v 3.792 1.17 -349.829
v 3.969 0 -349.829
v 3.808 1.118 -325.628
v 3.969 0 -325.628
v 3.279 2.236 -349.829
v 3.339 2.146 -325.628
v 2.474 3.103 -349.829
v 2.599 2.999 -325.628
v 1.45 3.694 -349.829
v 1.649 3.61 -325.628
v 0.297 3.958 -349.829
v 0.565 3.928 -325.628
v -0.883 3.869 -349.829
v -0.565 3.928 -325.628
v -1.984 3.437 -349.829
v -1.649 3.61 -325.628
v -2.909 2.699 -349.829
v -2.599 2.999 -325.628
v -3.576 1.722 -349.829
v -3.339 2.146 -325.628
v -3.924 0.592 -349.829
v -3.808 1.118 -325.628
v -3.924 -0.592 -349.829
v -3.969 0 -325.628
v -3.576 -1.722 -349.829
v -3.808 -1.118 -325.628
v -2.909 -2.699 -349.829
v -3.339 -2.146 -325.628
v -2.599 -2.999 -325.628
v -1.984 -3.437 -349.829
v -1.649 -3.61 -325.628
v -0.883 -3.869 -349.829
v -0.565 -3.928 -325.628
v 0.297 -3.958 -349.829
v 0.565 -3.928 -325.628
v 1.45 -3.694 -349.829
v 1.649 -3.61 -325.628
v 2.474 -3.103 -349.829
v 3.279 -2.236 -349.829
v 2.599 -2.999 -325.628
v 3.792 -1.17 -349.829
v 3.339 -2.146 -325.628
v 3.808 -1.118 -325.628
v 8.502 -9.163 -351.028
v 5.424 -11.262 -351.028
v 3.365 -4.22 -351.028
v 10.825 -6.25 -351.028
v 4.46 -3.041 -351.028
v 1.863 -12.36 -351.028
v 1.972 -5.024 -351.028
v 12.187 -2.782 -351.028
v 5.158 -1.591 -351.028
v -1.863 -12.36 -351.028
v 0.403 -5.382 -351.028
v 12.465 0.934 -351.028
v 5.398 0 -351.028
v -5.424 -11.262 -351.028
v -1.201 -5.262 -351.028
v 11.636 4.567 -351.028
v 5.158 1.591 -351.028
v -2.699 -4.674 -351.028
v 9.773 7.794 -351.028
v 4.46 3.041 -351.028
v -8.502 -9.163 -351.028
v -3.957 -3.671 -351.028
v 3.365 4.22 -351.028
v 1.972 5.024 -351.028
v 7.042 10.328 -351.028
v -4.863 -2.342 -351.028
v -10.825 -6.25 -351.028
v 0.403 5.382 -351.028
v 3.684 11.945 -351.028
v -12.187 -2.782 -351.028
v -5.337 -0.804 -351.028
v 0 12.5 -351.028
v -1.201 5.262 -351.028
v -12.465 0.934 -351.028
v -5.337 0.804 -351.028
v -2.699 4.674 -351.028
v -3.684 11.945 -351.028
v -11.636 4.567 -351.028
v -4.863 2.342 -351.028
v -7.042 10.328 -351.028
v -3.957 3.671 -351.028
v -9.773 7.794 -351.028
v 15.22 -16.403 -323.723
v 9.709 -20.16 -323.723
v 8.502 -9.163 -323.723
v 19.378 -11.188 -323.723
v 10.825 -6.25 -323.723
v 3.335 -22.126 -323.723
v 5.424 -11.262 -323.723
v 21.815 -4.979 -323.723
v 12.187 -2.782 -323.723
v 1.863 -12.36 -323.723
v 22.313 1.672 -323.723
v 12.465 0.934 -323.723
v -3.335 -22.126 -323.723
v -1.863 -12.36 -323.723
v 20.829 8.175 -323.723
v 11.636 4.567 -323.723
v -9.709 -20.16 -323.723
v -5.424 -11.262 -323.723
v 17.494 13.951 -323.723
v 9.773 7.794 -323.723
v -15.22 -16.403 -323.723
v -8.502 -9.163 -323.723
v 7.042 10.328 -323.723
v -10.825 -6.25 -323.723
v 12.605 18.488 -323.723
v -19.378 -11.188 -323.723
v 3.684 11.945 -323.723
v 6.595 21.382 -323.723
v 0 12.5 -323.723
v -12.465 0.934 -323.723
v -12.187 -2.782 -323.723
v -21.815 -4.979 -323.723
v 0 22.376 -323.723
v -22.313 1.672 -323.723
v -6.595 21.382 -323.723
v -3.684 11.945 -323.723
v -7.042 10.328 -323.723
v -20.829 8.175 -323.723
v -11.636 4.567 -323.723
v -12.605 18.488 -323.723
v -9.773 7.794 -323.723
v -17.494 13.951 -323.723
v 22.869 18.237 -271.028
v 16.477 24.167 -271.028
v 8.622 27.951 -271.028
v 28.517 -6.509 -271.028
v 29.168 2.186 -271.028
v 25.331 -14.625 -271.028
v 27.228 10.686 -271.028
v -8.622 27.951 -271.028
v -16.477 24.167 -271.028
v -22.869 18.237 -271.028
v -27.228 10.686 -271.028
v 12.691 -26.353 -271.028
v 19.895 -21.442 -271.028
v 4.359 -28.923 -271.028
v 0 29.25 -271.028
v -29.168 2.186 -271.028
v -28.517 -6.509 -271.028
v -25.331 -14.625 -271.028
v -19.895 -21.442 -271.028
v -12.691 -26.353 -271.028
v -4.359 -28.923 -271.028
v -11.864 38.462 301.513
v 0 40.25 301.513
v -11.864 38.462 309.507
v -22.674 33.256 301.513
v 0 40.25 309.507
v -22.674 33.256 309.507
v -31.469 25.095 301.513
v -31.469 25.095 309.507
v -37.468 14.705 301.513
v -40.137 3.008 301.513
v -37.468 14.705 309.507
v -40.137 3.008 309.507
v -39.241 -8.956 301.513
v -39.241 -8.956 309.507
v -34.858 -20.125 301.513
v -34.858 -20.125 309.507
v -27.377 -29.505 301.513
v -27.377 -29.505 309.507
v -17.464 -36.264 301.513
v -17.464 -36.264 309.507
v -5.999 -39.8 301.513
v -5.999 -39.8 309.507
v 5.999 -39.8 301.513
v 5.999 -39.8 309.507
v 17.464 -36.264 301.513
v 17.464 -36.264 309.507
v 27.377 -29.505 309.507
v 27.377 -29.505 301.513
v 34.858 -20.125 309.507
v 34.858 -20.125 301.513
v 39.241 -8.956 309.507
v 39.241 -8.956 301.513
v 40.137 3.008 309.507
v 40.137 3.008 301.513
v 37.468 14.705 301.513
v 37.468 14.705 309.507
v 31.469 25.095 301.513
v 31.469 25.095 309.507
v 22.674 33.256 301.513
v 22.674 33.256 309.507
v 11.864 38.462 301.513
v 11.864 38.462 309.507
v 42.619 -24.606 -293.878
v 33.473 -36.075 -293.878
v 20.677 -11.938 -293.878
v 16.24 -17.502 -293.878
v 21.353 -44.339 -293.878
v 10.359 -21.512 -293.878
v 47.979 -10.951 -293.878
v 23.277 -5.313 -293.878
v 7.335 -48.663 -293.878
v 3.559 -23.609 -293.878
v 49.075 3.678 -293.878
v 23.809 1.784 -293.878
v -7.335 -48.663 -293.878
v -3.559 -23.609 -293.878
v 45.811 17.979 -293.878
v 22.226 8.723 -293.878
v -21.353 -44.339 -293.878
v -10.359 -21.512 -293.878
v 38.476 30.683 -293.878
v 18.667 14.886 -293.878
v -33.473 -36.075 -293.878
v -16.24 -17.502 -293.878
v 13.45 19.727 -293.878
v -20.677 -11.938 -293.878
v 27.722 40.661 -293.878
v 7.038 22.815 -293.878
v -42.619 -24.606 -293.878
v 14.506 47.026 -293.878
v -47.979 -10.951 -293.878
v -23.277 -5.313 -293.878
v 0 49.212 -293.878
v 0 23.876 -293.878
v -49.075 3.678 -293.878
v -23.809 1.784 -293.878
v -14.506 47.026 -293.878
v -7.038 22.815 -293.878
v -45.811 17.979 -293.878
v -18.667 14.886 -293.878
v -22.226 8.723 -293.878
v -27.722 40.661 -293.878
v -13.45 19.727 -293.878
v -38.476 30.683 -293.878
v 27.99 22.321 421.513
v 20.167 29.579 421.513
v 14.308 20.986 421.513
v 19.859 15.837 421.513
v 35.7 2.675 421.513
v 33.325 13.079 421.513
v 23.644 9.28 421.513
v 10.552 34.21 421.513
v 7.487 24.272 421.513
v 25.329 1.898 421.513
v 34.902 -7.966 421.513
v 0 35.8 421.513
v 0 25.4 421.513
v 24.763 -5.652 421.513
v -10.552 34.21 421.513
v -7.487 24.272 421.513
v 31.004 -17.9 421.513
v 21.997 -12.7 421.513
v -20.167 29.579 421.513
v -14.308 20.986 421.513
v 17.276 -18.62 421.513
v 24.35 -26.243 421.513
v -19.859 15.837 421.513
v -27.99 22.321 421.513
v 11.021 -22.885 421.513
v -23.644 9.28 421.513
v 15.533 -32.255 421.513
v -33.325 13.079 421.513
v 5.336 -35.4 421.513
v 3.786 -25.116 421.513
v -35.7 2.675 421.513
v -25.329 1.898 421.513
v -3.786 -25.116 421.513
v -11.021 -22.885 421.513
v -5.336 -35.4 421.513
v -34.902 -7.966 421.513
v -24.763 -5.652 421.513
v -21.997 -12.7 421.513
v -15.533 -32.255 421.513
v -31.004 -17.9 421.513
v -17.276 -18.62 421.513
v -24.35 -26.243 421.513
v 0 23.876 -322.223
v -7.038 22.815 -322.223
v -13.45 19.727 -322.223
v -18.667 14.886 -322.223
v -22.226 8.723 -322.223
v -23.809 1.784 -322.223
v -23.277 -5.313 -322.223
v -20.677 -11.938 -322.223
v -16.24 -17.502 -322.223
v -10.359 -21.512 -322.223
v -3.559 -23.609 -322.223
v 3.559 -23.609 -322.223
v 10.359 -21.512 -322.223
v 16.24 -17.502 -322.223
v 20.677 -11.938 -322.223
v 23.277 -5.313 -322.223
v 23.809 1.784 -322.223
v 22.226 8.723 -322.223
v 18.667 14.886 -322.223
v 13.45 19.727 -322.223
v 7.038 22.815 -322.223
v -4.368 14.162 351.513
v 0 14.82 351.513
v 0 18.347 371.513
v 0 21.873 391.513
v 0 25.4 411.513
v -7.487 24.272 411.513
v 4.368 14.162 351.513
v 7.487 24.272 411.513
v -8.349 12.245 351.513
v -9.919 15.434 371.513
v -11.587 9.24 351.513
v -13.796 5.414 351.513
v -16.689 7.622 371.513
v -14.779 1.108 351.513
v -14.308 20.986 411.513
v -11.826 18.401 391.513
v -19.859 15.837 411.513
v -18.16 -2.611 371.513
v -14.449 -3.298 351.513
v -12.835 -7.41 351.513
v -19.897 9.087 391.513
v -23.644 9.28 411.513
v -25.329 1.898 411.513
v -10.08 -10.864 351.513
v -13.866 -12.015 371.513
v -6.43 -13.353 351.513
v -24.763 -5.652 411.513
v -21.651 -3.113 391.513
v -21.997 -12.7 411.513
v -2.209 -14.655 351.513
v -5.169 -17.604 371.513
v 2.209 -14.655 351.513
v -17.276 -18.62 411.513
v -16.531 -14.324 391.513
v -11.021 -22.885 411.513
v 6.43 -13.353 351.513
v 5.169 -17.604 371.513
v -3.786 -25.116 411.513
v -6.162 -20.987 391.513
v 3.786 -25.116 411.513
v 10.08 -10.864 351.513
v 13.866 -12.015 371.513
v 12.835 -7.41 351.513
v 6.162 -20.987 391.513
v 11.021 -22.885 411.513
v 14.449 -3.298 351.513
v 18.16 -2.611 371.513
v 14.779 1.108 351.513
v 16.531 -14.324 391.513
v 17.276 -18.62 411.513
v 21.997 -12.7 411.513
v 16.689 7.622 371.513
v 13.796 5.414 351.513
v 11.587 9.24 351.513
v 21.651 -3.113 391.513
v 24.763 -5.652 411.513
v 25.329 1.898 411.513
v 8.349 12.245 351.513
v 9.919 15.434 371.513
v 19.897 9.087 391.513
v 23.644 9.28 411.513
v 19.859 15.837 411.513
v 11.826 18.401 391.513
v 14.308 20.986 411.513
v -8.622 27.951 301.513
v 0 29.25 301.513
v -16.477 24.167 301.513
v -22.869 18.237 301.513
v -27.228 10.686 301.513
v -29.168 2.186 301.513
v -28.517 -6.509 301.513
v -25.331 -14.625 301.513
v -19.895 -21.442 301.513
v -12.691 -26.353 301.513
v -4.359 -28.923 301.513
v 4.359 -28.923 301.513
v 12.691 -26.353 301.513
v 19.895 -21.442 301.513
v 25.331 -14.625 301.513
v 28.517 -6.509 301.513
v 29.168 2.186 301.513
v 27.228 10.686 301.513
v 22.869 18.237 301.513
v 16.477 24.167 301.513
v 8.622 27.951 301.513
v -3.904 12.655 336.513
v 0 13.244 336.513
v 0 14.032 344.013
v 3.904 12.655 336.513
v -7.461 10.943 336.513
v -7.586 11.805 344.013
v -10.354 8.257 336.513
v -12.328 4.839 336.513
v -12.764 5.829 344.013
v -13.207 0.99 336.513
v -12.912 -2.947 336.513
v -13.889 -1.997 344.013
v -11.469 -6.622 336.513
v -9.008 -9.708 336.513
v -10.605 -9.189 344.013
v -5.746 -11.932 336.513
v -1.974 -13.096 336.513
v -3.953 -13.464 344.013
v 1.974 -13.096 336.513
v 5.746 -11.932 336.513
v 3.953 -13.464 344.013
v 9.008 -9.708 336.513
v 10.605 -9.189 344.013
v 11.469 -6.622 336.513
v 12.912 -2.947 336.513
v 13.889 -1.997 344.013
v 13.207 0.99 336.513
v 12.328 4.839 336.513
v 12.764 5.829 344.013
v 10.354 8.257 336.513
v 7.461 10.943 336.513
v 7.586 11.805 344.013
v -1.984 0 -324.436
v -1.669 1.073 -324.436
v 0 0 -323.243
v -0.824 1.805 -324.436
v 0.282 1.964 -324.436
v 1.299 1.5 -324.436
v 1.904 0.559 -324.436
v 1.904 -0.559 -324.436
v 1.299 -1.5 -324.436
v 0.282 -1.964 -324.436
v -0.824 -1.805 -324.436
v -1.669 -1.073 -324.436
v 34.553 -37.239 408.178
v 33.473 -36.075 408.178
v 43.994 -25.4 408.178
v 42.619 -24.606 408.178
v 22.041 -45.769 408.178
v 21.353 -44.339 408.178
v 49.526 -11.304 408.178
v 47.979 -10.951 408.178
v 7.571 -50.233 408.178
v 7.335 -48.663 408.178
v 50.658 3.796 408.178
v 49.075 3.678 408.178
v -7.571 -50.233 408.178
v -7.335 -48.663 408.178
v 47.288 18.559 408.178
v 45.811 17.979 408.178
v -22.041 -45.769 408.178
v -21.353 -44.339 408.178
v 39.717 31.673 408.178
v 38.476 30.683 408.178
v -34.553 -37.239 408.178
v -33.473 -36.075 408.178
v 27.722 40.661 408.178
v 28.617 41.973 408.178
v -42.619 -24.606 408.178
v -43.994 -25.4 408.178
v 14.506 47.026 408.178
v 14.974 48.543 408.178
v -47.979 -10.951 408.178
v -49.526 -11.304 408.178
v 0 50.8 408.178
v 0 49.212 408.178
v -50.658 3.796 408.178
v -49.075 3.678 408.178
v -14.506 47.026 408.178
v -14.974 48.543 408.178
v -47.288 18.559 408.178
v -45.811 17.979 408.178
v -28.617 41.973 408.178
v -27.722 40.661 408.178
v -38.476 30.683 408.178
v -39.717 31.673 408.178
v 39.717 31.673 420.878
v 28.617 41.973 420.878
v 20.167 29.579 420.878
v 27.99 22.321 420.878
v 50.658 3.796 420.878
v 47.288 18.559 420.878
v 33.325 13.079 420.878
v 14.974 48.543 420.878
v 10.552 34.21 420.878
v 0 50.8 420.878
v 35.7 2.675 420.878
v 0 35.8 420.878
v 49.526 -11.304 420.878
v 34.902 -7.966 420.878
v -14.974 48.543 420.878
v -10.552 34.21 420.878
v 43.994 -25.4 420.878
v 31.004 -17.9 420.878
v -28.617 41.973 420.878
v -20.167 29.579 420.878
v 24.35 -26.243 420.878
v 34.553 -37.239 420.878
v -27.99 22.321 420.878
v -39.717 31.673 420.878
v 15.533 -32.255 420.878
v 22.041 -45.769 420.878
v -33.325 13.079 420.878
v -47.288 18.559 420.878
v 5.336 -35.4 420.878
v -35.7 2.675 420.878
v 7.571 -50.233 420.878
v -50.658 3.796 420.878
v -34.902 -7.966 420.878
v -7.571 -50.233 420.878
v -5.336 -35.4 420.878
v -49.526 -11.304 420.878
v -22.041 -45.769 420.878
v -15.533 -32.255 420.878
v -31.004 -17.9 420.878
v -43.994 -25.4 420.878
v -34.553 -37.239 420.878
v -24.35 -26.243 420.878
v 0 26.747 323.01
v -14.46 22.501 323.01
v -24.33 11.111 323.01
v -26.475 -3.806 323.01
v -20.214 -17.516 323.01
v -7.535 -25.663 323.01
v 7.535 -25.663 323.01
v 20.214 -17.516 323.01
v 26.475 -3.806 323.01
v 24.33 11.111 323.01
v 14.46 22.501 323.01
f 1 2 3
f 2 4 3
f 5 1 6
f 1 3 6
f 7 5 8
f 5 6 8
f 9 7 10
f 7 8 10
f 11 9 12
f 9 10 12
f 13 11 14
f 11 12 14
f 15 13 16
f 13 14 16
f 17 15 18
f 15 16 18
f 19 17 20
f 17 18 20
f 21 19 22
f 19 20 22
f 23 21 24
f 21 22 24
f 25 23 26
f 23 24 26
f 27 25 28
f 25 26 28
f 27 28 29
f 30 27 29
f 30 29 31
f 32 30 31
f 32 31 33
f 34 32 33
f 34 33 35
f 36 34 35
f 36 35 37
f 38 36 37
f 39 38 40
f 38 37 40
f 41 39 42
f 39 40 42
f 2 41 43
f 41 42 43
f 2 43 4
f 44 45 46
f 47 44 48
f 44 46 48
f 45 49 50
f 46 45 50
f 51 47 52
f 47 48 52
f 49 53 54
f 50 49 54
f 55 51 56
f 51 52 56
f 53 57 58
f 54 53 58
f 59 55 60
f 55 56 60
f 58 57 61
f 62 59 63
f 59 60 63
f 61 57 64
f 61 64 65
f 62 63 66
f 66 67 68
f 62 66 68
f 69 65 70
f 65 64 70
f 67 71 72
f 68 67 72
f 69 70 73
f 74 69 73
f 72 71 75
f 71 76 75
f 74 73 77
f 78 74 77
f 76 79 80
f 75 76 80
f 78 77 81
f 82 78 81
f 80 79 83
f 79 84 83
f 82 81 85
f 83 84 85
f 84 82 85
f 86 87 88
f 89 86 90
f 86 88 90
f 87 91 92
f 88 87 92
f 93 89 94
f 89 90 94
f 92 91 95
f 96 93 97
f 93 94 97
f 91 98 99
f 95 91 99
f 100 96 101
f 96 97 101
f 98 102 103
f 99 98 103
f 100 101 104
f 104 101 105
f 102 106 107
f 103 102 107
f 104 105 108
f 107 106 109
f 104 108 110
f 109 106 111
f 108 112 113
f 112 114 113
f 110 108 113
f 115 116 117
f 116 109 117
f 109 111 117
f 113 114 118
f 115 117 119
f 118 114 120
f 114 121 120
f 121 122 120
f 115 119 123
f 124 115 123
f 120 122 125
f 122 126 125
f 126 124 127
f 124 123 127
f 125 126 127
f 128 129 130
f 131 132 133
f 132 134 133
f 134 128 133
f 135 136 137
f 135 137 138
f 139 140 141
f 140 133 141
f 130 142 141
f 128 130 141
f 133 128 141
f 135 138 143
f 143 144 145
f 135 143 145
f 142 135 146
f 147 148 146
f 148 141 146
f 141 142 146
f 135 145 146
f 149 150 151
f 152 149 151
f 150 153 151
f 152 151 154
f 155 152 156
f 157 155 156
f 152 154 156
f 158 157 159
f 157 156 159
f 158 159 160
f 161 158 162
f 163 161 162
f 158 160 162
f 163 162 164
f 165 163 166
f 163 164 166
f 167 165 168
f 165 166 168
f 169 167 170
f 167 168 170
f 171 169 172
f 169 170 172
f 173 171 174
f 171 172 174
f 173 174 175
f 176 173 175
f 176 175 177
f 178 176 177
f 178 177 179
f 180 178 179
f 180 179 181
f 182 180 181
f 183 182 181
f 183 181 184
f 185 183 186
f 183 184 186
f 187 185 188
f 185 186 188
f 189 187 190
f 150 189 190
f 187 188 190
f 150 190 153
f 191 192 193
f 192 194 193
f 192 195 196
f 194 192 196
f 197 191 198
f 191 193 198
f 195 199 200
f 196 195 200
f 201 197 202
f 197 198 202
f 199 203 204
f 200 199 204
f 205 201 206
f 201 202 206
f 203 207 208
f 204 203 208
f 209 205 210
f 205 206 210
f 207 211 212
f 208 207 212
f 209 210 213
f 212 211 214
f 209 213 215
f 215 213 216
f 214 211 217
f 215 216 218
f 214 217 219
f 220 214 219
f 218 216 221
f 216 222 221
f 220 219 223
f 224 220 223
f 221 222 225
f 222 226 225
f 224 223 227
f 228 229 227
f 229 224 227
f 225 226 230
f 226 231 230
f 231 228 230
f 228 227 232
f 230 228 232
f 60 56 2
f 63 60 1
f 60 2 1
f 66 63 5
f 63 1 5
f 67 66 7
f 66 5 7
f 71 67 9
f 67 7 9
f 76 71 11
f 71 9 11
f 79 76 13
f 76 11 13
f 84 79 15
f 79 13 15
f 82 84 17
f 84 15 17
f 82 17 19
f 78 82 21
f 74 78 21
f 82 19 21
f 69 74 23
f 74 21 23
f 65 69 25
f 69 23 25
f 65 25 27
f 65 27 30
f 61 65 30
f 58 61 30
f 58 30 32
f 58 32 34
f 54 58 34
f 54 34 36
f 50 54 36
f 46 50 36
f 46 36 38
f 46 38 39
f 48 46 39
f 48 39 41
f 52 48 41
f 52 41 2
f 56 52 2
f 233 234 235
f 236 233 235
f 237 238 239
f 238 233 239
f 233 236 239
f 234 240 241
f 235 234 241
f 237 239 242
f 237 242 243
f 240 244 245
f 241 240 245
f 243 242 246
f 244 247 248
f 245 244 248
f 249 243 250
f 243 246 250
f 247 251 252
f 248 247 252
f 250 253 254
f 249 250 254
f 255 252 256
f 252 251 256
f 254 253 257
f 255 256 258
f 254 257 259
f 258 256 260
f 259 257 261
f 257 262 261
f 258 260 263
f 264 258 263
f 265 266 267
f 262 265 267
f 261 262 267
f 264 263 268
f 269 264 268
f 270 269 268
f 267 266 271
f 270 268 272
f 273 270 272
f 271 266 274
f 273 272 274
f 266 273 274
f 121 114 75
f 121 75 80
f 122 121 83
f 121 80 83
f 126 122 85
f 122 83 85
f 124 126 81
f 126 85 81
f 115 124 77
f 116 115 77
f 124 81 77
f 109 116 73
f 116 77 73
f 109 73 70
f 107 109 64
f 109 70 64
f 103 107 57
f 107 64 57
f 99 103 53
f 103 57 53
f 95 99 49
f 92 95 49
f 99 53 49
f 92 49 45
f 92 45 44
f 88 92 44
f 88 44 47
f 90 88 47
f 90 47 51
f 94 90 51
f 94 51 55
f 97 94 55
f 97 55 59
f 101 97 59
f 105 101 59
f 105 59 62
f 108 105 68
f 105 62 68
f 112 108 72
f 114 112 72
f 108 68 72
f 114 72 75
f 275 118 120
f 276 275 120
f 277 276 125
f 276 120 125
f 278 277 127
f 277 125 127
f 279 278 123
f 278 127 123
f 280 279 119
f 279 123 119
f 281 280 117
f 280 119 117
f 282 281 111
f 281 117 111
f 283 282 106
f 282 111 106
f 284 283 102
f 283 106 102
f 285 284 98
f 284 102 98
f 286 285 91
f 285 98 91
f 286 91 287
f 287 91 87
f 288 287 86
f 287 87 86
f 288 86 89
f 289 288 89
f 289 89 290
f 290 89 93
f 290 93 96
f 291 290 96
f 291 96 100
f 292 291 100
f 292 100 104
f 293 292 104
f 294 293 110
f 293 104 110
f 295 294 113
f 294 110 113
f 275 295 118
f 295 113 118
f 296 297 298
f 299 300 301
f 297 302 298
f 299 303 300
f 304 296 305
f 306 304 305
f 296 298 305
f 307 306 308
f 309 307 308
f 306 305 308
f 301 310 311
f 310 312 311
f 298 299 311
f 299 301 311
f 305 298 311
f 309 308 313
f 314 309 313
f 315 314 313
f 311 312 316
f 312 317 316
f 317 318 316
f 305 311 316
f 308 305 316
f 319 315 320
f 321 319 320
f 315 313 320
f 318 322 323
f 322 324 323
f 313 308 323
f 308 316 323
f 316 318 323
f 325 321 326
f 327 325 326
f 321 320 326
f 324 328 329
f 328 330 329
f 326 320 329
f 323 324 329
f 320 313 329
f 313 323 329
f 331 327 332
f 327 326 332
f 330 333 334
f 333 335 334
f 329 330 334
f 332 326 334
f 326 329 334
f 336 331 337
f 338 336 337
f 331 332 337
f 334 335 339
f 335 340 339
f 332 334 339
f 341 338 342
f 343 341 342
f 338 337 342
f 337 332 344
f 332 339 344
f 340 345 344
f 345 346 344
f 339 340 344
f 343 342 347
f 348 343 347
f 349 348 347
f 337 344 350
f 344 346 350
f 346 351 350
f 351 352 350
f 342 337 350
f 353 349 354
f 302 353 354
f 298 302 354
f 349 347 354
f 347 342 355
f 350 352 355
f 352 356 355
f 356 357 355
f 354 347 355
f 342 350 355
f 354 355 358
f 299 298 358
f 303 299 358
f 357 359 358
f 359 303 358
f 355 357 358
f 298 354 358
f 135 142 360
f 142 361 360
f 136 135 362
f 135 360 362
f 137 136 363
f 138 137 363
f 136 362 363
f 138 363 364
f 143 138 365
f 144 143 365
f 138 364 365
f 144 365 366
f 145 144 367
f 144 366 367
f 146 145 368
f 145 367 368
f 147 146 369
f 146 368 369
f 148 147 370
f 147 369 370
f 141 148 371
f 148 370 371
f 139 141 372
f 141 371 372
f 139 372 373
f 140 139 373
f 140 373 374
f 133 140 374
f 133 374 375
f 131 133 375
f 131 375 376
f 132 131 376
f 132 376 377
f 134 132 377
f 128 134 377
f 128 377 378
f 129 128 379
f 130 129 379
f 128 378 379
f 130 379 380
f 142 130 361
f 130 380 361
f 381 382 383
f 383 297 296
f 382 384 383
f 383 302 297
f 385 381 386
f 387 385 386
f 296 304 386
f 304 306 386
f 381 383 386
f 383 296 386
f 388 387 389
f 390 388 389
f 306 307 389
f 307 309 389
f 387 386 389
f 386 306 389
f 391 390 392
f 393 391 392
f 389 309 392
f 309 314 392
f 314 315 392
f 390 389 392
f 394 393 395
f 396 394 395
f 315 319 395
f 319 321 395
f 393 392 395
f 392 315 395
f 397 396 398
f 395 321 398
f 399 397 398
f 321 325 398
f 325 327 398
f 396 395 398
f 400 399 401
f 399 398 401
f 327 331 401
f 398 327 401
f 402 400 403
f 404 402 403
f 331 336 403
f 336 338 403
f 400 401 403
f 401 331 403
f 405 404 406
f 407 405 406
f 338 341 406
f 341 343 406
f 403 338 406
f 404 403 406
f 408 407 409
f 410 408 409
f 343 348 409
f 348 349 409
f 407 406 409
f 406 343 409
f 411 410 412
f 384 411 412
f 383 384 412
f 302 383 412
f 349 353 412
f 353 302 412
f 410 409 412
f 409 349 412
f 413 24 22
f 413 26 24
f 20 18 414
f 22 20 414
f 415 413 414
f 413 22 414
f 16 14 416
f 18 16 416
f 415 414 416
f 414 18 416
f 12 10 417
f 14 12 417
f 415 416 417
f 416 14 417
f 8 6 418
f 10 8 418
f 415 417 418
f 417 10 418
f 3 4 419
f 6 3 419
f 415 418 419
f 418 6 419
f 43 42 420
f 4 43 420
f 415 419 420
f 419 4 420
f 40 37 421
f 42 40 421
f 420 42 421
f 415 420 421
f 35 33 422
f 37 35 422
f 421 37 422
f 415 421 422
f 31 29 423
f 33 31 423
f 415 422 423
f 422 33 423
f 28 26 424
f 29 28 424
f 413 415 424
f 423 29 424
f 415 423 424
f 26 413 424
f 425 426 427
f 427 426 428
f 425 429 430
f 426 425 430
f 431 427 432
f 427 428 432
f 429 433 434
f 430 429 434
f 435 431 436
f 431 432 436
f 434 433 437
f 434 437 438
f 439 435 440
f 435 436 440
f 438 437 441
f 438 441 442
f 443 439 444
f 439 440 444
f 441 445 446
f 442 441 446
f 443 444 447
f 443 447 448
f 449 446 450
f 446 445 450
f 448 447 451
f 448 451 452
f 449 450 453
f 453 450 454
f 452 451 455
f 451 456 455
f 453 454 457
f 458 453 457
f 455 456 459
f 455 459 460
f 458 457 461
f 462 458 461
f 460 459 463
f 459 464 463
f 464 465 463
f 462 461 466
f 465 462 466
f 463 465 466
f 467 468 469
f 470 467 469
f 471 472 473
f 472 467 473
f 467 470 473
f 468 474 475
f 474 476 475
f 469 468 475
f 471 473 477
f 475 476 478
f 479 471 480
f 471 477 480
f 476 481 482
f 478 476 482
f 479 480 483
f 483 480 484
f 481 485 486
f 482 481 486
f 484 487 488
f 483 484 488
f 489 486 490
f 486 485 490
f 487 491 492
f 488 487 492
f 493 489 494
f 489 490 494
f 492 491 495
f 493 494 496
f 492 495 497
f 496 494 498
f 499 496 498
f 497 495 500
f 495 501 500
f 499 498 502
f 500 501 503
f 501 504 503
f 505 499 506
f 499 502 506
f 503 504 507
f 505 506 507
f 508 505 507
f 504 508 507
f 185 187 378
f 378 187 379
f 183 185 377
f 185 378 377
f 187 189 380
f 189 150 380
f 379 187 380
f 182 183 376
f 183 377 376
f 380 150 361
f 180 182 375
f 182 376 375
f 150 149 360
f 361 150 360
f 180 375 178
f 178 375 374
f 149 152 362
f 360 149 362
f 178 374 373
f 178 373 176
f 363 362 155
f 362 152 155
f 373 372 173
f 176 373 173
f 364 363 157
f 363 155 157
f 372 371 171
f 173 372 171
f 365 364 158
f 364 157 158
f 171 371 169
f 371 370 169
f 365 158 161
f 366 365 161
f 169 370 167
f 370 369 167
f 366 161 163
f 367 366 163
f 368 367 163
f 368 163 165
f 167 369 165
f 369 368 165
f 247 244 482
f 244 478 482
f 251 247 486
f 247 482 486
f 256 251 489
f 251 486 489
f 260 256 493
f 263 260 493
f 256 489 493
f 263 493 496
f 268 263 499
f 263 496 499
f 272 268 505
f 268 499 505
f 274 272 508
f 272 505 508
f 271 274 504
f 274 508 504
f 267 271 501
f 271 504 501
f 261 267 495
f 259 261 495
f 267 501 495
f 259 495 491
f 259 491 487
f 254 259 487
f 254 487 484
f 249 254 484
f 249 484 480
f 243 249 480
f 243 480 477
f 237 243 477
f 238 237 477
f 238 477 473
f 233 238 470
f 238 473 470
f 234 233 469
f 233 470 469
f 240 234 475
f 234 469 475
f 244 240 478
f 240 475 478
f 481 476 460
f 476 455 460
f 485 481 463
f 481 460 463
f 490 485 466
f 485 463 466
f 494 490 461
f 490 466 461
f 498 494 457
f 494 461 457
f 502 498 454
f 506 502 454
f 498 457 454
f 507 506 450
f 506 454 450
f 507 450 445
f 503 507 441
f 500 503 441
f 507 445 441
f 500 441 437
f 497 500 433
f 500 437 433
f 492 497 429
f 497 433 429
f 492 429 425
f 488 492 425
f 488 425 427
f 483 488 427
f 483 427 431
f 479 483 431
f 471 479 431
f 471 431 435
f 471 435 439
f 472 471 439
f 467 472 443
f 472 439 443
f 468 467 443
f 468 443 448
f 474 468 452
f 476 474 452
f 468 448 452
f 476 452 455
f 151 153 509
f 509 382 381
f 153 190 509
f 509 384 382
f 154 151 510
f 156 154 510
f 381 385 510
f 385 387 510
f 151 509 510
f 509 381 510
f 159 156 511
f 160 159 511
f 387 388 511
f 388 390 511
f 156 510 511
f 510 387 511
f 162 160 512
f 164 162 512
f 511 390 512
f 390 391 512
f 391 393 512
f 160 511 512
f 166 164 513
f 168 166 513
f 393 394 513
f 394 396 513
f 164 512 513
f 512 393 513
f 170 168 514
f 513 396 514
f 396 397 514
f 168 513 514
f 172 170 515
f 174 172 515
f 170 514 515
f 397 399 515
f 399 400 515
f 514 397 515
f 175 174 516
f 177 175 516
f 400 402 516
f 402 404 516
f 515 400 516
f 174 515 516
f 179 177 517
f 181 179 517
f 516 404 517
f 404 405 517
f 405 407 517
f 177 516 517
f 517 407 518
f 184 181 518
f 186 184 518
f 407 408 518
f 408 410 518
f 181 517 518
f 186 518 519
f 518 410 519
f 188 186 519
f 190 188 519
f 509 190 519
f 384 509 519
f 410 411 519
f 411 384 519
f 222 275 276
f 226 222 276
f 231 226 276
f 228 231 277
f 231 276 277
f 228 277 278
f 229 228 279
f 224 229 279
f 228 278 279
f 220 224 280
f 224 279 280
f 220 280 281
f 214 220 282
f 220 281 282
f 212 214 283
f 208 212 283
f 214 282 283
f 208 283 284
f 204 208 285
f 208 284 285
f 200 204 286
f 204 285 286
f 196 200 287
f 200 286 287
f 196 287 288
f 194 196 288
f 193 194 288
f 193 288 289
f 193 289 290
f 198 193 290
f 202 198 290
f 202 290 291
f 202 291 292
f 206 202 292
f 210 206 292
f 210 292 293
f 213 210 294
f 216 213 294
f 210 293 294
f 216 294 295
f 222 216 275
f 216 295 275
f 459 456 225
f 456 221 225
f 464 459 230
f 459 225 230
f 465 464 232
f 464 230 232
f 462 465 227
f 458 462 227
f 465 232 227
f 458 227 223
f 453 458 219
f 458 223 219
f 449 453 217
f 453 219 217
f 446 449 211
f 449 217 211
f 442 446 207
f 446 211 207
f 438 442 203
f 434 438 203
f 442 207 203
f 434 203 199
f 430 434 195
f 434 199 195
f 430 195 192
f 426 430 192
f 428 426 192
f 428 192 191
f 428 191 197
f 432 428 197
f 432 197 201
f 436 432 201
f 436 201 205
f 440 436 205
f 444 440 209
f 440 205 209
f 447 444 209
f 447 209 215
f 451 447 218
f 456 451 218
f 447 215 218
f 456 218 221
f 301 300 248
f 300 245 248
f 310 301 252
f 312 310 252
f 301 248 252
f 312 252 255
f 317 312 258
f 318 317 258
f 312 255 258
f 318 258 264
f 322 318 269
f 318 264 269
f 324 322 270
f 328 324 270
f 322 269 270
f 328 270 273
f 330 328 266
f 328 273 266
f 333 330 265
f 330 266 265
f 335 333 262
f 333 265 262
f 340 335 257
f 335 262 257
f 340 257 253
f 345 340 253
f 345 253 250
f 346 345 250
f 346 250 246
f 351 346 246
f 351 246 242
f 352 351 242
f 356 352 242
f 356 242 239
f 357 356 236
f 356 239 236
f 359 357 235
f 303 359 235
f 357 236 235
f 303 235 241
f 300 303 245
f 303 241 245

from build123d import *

# Parameters (mm, degrees)
CHAMFER1_SIZE                     = 1.5
F_3_8_16_TAPPED_HOLE1_D           = 7.9375
F_3_8_16_TAPPED_HOLE1_DEPTH       = 25.4
F_3_8_16_TAPPED_HOLE1_CSINK_D     = 10.795
F_3_8_16_TAPPED_HOLE1_CSINK_ANGLE = 100
F_3_8_16_TAPPED_HOLE1_TIP         = 2.384665582


with BuildPart() as part:
    # Sketch1 → Revolve1 (revolve)
    with BuildSketch(Plane(origin=(0, 0, 0), x_dir=(0, 0, -1), z_dir=(1, 0, 0))):
        Polygon((-420.878, 50.8), (-408.178, 50.8), (-408.178, 49.2125), (293.878, 49.2125), (293.878, 23.876), (323.723, 23.876), (323.723, 12.5), (351.028, 12.5), (351.028, 0), (271.028, 0), (271.028, 29.25), (-301.513, 29.25), (-301.513, 40.25), (-309.506817629, 40.25), (-336.513, 13.243817629), (-351.513, 14.820381157), (-411.513, 25.4), (-421.513, 25.4), (-421.513, 35.8), (-420.878, 35.8), align=None)
    revolve(axis=Axis((0, 0, -473.12001368), (0, 0, 1)))

    # Chamfer1
    chamfer1_edges = [part.edges().sort_by_distance(p)[0] for p in [
        (0, -23.876, -323.723),
    ]]
    chamfer(chamfer1_edges, length=CHAMFER1_SIZE)

    # 3/8-16 Tapped Hole1
    with Locations(Plane(origin=(0, 0, -351.028), x_dir=(-1, 0, 0), z_dir=(0, 0, -1))):
        with Locations((0, 0)):
            CounterSinkHole(F_3_8_16_TAPPED_HOLE1_D / 2, F_3_8_16_TAPPED_HOLE1_CSINK_D / 2, depth=F_3_8_16_TAPPED_HOLE1_DEPTH, counter_sink_angle=F_3_8_16_TAPPED_HOLE1_CSINK_ANGLE)
            with Locations((0, 0, -(F_3_8_16_TAPPED_HOLE1_DEPTH + F_3_8_16_TAPPED_HOLE1_TIP / 2))):  # 118° drill point
                Cone(0, F_3_8_16_TAPPED_HOLE1_D / 2, F_3_8_16_TAPPED_HOLE1_TIP, mode=Mode.SUBTRACT)


solid = part.part
